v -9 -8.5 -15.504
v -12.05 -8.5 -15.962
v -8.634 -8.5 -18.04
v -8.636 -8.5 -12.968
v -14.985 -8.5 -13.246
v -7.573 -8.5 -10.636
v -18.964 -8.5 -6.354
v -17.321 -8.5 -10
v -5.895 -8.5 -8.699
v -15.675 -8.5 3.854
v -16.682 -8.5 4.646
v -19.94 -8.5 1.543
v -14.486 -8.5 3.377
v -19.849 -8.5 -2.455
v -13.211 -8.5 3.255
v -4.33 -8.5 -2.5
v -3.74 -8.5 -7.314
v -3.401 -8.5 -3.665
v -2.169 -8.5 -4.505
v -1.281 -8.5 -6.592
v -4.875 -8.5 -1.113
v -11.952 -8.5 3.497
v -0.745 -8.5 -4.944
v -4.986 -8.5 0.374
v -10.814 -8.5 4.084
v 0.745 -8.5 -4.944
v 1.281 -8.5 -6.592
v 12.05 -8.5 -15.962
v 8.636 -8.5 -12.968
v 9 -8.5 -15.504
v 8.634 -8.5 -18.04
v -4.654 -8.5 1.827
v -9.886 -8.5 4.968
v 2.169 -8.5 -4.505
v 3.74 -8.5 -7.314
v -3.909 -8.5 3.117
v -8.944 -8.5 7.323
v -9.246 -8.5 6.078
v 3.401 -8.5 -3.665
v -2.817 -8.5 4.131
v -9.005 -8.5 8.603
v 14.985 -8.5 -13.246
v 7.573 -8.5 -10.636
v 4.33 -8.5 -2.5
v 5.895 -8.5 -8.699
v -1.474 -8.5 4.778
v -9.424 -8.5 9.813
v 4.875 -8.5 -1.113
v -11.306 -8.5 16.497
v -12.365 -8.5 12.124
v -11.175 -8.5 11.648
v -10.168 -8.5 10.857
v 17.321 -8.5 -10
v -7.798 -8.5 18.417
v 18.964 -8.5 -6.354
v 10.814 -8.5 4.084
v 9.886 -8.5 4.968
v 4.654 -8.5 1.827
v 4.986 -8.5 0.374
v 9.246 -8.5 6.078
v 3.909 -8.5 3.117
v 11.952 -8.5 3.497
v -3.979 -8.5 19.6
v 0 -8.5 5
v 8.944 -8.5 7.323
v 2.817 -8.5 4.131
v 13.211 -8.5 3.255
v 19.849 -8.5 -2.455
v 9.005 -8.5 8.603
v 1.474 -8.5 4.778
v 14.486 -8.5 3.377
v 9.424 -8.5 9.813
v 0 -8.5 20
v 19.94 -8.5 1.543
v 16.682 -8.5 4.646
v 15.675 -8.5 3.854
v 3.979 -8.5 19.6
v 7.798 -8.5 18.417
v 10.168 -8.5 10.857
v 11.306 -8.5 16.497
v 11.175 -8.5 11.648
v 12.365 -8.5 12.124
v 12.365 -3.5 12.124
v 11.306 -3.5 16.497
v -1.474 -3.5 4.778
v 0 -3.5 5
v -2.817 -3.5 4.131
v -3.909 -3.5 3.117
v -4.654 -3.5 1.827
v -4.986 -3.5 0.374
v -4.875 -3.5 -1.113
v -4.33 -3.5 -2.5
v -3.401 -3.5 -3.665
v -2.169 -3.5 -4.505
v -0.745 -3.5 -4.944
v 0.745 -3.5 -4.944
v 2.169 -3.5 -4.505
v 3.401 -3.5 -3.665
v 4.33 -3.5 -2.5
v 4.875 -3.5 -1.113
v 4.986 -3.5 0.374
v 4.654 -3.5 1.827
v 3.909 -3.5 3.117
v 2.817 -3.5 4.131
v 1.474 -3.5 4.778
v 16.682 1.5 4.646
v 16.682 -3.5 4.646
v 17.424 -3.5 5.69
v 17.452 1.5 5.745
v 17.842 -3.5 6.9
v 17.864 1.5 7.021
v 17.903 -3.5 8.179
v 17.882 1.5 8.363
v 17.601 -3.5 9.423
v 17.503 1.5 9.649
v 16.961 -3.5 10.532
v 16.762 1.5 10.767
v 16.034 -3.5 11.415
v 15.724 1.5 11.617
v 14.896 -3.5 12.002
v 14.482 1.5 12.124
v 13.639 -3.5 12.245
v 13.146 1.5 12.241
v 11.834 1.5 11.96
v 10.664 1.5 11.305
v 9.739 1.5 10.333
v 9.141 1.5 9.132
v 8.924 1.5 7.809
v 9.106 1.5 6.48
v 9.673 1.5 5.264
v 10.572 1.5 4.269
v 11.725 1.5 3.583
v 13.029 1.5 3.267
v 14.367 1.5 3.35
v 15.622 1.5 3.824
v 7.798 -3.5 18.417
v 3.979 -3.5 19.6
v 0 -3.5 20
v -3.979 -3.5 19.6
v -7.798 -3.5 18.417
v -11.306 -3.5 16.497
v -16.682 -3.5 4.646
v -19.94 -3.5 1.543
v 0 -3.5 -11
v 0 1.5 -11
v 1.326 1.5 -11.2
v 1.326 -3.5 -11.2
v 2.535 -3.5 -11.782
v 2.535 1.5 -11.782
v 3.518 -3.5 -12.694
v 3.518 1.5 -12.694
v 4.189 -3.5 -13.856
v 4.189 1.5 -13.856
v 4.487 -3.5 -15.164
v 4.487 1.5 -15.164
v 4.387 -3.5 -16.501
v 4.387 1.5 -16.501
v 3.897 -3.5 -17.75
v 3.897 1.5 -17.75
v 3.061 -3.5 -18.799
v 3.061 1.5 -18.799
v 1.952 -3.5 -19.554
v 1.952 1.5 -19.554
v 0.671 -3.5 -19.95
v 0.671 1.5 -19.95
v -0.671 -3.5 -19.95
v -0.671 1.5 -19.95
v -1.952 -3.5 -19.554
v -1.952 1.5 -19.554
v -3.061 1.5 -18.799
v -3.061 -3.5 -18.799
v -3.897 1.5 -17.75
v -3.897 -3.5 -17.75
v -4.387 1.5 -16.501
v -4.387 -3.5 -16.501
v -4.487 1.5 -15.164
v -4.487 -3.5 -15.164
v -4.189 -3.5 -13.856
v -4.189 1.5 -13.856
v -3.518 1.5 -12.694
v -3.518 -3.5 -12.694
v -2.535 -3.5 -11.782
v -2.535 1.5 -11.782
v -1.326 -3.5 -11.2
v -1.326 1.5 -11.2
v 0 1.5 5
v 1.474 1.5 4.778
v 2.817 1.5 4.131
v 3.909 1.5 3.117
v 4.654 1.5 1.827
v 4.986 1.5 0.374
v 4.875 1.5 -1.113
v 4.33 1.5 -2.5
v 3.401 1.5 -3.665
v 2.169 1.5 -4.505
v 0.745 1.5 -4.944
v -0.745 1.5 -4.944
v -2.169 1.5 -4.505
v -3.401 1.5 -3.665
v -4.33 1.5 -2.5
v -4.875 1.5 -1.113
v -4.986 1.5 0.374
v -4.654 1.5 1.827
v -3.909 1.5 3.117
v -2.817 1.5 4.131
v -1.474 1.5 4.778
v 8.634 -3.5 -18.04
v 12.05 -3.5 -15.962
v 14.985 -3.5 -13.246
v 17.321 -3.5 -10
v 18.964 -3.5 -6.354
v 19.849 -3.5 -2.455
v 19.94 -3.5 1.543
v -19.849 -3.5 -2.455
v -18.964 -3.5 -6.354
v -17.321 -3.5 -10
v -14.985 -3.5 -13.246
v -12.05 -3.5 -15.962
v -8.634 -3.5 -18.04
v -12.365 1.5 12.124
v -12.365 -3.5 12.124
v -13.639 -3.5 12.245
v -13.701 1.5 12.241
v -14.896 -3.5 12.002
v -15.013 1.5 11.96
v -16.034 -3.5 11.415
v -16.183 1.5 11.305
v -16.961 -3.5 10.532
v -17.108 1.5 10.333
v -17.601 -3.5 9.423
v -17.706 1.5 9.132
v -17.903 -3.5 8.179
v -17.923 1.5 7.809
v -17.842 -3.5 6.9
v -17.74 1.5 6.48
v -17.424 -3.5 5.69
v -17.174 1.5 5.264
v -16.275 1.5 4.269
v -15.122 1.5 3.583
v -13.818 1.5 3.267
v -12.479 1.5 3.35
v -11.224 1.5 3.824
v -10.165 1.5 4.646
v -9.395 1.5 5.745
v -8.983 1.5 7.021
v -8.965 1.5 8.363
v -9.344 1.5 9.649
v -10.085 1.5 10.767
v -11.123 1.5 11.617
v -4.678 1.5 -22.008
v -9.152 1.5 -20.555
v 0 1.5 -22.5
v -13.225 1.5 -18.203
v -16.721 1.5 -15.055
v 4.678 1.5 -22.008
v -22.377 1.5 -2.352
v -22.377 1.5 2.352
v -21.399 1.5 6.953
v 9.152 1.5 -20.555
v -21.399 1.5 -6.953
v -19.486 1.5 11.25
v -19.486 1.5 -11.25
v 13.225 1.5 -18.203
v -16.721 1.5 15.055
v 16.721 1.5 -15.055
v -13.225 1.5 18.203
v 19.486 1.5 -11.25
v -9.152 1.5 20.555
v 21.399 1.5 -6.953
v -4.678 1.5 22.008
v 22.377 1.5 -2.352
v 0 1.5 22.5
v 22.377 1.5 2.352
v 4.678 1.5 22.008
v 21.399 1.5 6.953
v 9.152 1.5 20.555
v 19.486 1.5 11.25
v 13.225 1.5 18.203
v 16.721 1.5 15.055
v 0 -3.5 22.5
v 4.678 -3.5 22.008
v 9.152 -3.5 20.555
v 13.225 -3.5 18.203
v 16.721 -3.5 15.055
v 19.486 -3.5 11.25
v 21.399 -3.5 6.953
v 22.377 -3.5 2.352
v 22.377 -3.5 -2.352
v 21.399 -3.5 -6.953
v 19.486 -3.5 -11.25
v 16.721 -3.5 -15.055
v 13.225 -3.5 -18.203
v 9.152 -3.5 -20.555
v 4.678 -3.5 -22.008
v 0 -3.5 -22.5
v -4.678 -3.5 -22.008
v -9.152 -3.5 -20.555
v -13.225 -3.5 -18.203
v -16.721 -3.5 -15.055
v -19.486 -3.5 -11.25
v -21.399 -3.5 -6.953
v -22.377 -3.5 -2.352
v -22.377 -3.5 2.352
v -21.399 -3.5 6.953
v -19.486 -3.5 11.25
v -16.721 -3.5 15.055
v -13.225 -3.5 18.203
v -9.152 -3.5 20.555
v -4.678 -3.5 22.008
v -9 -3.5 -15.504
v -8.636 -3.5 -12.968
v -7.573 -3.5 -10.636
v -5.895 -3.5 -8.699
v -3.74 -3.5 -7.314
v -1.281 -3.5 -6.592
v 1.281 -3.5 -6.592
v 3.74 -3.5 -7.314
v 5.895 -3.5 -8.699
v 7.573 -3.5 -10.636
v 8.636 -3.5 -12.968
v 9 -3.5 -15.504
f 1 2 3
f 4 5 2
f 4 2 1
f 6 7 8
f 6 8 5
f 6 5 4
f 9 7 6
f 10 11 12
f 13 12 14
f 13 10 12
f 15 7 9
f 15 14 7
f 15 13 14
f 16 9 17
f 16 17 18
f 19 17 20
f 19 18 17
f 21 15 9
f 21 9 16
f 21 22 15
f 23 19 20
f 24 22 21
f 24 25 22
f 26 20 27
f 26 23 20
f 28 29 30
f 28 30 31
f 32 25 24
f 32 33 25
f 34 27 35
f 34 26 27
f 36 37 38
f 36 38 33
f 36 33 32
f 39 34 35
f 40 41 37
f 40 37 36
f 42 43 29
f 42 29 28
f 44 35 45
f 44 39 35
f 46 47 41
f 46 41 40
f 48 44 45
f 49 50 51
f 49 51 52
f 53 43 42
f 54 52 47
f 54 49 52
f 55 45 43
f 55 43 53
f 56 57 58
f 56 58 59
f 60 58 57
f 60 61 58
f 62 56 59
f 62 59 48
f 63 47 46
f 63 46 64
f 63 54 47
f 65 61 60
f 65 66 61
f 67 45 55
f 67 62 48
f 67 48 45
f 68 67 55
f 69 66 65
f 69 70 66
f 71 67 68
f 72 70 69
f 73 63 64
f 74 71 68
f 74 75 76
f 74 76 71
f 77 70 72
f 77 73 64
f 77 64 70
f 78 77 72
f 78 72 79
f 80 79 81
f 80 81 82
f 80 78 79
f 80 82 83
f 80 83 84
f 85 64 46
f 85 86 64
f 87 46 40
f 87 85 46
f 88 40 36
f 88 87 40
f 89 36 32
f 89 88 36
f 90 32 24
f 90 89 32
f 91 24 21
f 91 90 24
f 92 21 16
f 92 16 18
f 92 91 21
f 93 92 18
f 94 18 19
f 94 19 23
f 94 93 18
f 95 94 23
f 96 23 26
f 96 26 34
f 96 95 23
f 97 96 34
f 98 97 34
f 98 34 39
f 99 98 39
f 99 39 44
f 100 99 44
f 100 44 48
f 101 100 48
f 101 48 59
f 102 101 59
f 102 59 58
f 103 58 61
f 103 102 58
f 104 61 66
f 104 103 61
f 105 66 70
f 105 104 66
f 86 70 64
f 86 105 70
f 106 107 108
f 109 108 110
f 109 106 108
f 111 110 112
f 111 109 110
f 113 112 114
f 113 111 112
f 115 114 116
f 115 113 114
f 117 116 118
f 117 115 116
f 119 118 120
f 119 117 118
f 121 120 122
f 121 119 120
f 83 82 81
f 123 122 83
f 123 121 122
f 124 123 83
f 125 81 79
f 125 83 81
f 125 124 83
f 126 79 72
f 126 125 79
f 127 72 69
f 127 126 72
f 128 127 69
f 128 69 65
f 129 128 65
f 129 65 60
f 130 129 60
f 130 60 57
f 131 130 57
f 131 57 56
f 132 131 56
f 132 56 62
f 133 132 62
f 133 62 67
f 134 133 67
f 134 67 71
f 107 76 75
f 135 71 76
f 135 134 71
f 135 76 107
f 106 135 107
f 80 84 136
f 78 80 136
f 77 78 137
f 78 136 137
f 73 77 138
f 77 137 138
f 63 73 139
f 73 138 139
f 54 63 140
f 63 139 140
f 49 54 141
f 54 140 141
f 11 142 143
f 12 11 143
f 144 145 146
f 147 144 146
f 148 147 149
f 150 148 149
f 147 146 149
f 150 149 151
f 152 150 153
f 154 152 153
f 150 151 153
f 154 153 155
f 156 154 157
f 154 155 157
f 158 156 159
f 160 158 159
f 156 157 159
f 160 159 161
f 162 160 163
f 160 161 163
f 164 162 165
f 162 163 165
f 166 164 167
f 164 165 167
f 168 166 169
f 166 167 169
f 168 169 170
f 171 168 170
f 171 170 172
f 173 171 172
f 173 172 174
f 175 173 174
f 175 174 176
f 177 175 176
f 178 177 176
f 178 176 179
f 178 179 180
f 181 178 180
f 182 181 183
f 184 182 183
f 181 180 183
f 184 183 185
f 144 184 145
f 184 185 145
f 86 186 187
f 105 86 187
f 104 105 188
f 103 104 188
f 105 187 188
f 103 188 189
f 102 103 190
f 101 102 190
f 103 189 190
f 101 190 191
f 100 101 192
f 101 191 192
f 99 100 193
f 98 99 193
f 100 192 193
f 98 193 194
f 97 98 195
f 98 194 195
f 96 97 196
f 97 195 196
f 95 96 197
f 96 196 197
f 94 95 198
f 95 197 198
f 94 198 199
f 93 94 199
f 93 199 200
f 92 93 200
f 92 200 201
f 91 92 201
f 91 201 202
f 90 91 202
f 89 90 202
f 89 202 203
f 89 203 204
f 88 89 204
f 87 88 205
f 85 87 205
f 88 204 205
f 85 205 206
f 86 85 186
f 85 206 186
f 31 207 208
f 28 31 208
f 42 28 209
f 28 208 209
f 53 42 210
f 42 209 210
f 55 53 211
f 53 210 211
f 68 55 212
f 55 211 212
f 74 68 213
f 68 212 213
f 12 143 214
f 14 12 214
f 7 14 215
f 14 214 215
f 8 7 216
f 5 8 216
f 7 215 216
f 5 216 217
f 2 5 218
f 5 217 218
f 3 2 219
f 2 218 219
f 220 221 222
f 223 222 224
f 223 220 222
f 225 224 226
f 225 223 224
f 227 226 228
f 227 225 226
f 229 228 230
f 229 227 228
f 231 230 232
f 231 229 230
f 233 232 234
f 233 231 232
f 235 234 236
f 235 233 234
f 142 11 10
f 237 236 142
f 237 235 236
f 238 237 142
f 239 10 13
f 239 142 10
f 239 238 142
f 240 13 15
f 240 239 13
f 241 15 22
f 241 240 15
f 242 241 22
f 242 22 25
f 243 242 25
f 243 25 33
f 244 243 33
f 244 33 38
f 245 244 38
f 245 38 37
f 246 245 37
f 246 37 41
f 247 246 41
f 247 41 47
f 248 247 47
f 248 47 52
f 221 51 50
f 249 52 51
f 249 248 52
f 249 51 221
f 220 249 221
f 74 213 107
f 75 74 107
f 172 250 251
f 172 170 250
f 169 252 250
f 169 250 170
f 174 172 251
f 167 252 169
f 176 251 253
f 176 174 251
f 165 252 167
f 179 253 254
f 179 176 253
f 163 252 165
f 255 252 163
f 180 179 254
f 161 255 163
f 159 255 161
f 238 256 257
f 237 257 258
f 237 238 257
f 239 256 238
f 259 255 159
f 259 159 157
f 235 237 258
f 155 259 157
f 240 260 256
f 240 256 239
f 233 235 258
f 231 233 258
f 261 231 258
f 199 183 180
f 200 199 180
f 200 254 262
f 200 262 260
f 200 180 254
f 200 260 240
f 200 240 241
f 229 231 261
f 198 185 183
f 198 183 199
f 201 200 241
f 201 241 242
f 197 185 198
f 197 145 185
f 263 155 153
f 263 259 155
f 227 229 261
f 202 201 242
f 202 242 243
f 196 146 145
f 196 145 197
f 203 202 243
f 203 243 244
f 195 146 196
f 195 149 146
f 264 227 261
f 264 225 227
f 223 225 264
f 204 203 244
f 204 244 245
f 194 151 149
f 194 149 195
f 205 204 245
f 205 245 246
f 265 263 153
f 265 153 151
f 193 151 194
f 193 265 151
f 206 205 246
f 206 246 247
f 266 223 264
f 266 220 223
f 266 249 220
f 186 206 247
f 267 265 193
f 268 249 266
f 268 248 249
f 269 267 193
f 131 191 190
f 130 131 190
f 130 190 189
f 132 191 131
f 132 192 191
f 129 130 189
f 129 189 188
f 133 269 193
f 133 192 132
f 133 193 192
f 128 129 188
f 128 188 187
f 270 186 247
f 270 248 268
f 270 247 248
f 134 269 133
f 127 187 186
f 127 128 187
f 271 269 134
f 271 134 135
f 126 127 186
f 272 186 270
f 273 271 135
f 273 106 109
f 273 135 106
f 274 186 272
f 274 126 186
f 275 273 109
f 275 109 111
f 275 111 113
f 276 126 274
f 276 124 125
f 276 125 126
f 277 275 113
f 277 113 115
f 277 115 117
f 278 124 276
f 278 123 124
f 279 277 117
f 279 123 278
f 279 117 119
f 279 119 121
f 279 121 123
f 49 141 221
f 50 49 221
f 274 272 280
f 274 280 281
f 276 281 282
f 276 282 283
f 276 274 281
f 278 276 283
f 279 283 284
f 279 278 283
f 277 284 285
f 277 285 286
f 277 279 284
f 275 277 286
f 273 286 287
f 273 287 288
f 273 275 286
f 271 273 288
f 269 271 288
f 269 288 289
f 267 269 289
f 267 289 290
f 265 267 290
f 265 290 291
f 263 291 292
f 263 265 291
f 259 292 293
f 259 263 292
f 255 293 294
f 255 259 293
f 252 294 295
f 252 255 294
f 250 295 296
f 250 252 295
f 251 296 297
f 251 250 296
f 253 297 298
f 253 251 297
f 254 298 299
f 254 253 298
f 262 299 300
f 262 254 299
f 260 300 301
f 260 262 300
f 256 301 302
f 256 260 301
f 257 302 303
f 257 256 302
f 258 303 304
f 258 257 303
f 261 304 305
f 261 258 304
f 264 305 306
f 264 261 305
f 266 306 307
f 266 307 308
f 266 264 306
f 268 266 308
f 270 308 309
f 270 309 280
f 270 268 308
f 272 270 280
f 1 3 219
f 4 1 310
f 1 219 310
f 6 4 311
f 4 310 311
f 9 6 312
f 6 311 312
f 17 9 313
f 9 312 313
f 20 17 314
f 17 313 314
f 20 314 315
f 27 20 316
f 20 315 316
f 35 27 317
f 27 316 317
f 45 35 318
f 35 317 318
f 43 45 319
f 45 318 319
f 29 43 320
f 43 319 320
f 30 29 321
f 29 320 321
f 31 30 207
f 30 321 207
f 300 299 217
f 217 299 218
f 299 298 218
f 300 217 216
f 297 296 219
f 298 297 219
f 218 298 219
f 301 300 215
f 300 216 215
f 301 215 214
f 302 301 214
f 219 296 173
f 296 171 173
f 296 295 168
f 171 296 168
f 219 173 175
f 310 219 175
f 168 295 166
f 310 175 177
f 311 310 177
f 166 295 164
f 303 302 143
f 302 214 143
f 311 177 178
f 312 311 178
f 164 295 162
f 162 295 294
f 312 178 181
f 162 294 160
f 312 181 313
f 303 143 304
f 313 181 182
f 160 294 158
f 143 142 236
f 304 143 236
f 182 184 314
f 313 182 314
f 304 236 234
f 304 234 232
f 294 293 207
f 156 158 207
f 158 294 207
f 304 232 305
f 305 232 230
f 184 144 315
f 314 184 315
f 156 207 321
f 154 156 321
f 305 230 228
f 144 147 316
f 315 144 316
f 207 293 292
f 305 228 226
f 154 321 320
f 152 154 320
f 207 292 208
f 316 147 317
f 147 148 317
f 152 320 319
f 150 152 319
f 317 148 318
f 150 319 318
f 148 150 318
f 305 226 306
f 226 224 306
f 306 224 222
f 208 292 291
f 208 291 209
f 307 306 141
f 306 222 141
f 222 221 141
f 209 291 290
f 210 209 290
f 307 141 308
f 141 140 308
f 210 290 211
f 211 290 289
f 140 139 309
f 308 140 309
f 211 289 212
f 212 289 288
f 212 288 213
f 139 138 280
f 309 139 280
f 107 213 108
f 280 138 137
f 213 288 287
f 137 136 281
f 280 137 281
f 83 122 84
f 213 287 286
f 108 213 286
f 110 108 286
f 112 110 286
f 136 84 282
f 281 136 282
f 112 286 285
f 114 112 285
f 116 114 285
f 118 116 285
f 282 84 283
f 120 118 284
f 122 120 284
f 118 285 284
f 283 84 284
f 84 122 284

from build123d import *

# Parameters (mm, degrees)
SKETCH1_R           = 22.5
BOSS_EXTRUDE1_DEPTH = 3.5
SKETCH2_R           = 9
SKETCH2_R_2         = 9.000000000000007
CUT_EXTRUDE1_DEPTH  = 33.58066911528982
SKETCH7_R           = 5
CUT_EXTRUDE2_DEPTH  = 33.58066911528982
SKETCH8_R           = 5
BOSS_EXTRUDE2_DEPTH = 5
BOSS_EXTRUDE4_START = -5
BOSS_EXTRUDE4_DEPTH = 5
CUT_EXTRUDE3_DEPTH  = 7
BOSS_EXTRUDE8_START = 5
SKETCH15_R          = 22.5
SKETCH15_R_2        = 4.5
SKETCH15_R_3        = 5
BOSS_EXTRUDE8_DEPTH = 5


with BuildPart() as part:
    # Sketch1 → Boss-Extrude1 (new, symmetric)
    with BuildSketch(Plane(origin=(0, 0, 0), x_dir=(1, 0, 0), z_dir=(0, 1, 0))):
        with Locations(Location((0, 0, 0), (0, 0, 270))):
            Circle(SKETCH1_R)
    extrude(amount=BOSS_EXTRUDE1_DEPTH, both=True)

    # Sketch2 → Cut-Extrude1 (cut, through all)
    with BuildSketch(Plane(origin=(0, 3.5, 0), x_dir=(1, 0, 0), z_dir=(0, 1, 0))):
        with Locations((4.245e-14, 15.5)):
            Circle(SKETCH2_R)
        with Locations((13.42339375865983, -7.749999999999429)):
            Circle(SKETCH2_R_2)
        with Locations((-13.423393758657767, -7.7500000000005755)):
            Circle(SKETCH2_R)
    extrude(amount=-CUT_EXTRUDE1_DEPTH, mode=Mode.SUBTRACT)

    # Sketch7 → Cut-Extrude2 (cut, through all)
    with BuildSketch(Plane(origin=(0, 3.5, 0), x_dir=(1, 0, 0), z_dir=(0, 1, 0))):
        with Locations(Location((0, 0, 0), (0, 0, 270))):
            Circle(SKETCH7_R)
    extrude(amount=-CUT_EXTRUDE2_DEPTH, mode=Mode.SUBTRACT)

    # Sketch8 → Boss-Extrude2 (add)
    with BuildSketch(Plane.XZ.offset(3.5)):
        with BuildLine():
            ThreePointArc((8.634046628681784, -18.040322580645523), (16.921597628085173, -10.661122535323484), (20, -4.9e-15))
            ThreePointArc((20, 0), (19.985094686202057, 0.7720041344048885), (19.940400961646176, 1.5428575724221159))
            ThreePointArc((19.94040096164584, 1.542857572422255), (5.629165124599421, 3.250000000000214), (11.30635433296457, 16.497465008220495))
            ThreePointArc((11.306354332964553, 16.497465008220313), (1.07592e-12, 20), (-11.306354332962771, 16.497465008221535))
            ThreePointArc((-11.30635433296279, 16.497465008221706), (-5.629165124598033, 3.250000000000197), (-19.940400961645828, 1.5428575724255662))
            ThreePointArc((-19.940400961645913, 1.542857572425538), (-17.320508075688895, -9.999999999999787), (-8.634046628681693, -18.040322580645565))
            ThreePointArc((-8.634046628682263, -18.04032258064596), (1.954e-14, -6.5000000000000036), (8.634046628682352, -18.04032258064592))
        make_face()
        with Locations(Location((0, 0, 0), (0, 0, 90))):
            Circle(SKETCH8_R, mode=Mode.SUBTRACT)
    extrude(amount=BOSS_EXTRUDE2_DEPTH)

    # Sketch9 → Boss-Extrude4 (add)
    with BuildSketch(Plane.XZ.offset(8.5).offset(BOSS_EXTRUDE4_START)):
        with BuildLine():
            Line((-16.681897360151837, 4.646428786213113), (-19.940400961645906, 1.5428575724256501))
            ThreePointArc((-19.940400961645906, 1.5428575724256497), (-5.6291651245981145, 3.250000000000062), (-11.306354332962595, 16.497465008221653))
            Line((-11.306354332962595, 16.497465008221656), (-12.364874045810183, 12.123732504111118))
            ThreePointArc((-12.364874045810181, 12.123732504111118), (-9.52627944162794, 5.50000000000032), (-16.681897360151837, 4.646428786213113))
        make_face()
        with BuildLine():
            Line((12.3648740458121, 12.123732504109935), (11.306354332964363, 16.49746500822045))
            ThreePointArc((11.306354332964363, 16.49746500822045), (5.629165124599578, 3.249999999999936), (19.940400961646137, 1.5428575724225722))
            Line((19.94040096164614, 1.5428575724225757), (16.681897360152977, 4.646428786211002))
            ThreePointArc((16.681897360152977, 4.6464287862110005), (9.526279441629708, 5.499999999999686), (12.3648740458121, 12.123732504109935))
        make_face()
    extrude(amount=BOSS_EXTRUDE4_DEPTH)

    # Sketch10 → Cut-Extrude3 (cut)
    with BuildSketch(Plane(origin=(0, 3.5, 0), x_dir=(1, 0, 0), z_dir=(0, 1, 0))):
        with BuildLine():
            ThreePointArc((-6.73691741017109, 21.467741935483897), (2.481e-14, 6.5), (6.736917410171204, 21.46774193548386))
            ThreePointArc((6.736917410171204, 21.46774193548386), (19.485571585149323, 11.250000000000961), (21.96006858310362, -4.899529347333845))
            ThreePointArc((21.96006858310362, -4.899529347333845), (5.629165124599583, -3.24999999999993), (15.223151172932472, -16.56821258814737))
            ThreePointArc((15.223151172932472, -16.56821258814737), (6.8083e-13, -22.500000000000007), (-15.223151172931468, -16.568212588148292))
            ThreePointArc((-15.223151172931468, -16.568212588148292), (-5.629165124598114, -3.2500000000000657), (-21.960068583102636, -4.899529347338252))
            ThreePointArc((-21.960068583102636, -4.899529347338252), (-19.485571585150417, 11.249999999999057), (-6.73691741017109, 21.467741935483897))
        make_face()
    extrude(amount=-CUT_EXTRUDE3_DEPTH, mode=Mode.SUBTRACT)

    # Sketch15 → Boss-Extrude8 (add)
    # profile 1 of 2: a face of its own
    with BuildSketch(Plane(origin=(0, -3.5000000000000004, 0), x_dir=(1, 0, 0), z_dir=(0, 1, 0)).offset(BOSS_EXTRUDE8_START)):
        with Locations(Location((0, 0, 0), (0, 0, 270))):
            Circle(SKETCH15_R)
        with BuildLine():
            Line((-11.306354332962597, -16.49746500822166), (-12.364874045810184, -12.12373250411112))
            ThreePointArc((-12.364874045810184, -12.123732504111118), (-17.32050807568759, -10.000000000000831), (-16.681897360151837, -4.646428786213116))
            Line((-16.681897360151837, -4.646428786213116), (-19.9404009616459, -1.5428575724256433))
            ThreePointArc((-19.940400961645906, -1.5428575724256435), (-17.320508075689144, 9.99999999999936), (-8.63404662868249, 18.04032258064519))
            ThreePointArc((-8.634046628682489, 18.040322580645185), (1.865e-14, 6.499999999999998), (8.634046628682592, 18.040322580645135))
            ThreePointArc((8.634046628682588, 18.04032258064514), (17.320508075688394, 10.000000000000643), (19.94040096164614, -1.5428575724225746))
            Line((19.94040096164614, -1.5428575724225748), (16.681897360152977, -4.646428786211005))
            ThreePointArc((16.68189736015298, -4.646428786211002), (17.601507340572077, -6.078663140883227), (17.923393758659827, -7.749999999999429))
            ThreePointArc((17.923393758659827, -7.74999999999943), (16.206077830934763, -11.286476969231293), (12.3648740458121, -12.123732504109933))
            Line((12.3648740458121, -12.123732504109936), (11.306354332964357, -16.49746500822045))
            ThreePointArc((11.30635433296436, -16.49746500822045), (1.06937e-12, -20), (-11.306354332962597, -16.49746500822166))
        make_face(mode=Mode.SUBTRACT)
        with Locations(Location((4.245e-14, 15.5, 0), (0, 0, 270))):
            Circle(SKETCH15_R_2, mode=Mode.SUBTRACT)
    # profile 2 of 2: a face of its own
    with BuildSketch(Plane(origin=(0, -3.5000000000000004, 0), x_dir=(1, 0, 0), z_dir=(0, 1, 0)).offset(BOSS_EXTRUDE8_START)):
        with BuildLine():
            Line((-19.9404009616459, -1.5428575724256433), (-16.681897360151837, -4.646428786213116))
            ThreePointArc((-16.681897360151837, -4.646428786213116), (-9.526279441627942, -5.5000000000003215), (-12.364874045810184, -12.12373250411112))
            Line((-12.364874045810184, -12.12373250411112), (-11.306354332962597, -16.49746500822166))
            ThreePointArc((-11.306354332962597, -16.49746500822166), (1.06704e-12, -20.000000000000004), (11.306354332964357, -16.49746500822045))
            Line((11.306354332964357, -16.49746500822045), (12.3648740458121, -12.123732504109936))
            ThreePointArc((12.3648740458121, -12.123732504109936), (9.526279441629708, -5.499999999999686), (16.681897360152977, -4.646428786211005))
            Line((16.681897360152977, -4.646428786211005), (19.94040096164614, -1.5428575724225746))
            ThreePointArc((19.94040096164614, -1.5428575724225746), (17.3205080756884, 10.000000000000643), (8.634046628682588, 18.04032258064514))
            ThreePointArc((8.634046628682588, 18.04032258064514), (1.902e-14, 6.5), (-8.63404662868249, 18.040322580645185))
            ThreePointArc((-8.63404662868249, 18.040322580645185), (-17.320508075689144, 9.99999999999936), (-19.9404009616459, -1.5428575724256433))
        make_face()
        with Locations(Location((0, 0, 0), (0, 0, 270))):
            Circle(SKETCH15_R_3, mode=Mode.SUBTRACT)
    extrude(amount=-BOSS_EXTRUDE8_DEPTH)


solid = part.part
